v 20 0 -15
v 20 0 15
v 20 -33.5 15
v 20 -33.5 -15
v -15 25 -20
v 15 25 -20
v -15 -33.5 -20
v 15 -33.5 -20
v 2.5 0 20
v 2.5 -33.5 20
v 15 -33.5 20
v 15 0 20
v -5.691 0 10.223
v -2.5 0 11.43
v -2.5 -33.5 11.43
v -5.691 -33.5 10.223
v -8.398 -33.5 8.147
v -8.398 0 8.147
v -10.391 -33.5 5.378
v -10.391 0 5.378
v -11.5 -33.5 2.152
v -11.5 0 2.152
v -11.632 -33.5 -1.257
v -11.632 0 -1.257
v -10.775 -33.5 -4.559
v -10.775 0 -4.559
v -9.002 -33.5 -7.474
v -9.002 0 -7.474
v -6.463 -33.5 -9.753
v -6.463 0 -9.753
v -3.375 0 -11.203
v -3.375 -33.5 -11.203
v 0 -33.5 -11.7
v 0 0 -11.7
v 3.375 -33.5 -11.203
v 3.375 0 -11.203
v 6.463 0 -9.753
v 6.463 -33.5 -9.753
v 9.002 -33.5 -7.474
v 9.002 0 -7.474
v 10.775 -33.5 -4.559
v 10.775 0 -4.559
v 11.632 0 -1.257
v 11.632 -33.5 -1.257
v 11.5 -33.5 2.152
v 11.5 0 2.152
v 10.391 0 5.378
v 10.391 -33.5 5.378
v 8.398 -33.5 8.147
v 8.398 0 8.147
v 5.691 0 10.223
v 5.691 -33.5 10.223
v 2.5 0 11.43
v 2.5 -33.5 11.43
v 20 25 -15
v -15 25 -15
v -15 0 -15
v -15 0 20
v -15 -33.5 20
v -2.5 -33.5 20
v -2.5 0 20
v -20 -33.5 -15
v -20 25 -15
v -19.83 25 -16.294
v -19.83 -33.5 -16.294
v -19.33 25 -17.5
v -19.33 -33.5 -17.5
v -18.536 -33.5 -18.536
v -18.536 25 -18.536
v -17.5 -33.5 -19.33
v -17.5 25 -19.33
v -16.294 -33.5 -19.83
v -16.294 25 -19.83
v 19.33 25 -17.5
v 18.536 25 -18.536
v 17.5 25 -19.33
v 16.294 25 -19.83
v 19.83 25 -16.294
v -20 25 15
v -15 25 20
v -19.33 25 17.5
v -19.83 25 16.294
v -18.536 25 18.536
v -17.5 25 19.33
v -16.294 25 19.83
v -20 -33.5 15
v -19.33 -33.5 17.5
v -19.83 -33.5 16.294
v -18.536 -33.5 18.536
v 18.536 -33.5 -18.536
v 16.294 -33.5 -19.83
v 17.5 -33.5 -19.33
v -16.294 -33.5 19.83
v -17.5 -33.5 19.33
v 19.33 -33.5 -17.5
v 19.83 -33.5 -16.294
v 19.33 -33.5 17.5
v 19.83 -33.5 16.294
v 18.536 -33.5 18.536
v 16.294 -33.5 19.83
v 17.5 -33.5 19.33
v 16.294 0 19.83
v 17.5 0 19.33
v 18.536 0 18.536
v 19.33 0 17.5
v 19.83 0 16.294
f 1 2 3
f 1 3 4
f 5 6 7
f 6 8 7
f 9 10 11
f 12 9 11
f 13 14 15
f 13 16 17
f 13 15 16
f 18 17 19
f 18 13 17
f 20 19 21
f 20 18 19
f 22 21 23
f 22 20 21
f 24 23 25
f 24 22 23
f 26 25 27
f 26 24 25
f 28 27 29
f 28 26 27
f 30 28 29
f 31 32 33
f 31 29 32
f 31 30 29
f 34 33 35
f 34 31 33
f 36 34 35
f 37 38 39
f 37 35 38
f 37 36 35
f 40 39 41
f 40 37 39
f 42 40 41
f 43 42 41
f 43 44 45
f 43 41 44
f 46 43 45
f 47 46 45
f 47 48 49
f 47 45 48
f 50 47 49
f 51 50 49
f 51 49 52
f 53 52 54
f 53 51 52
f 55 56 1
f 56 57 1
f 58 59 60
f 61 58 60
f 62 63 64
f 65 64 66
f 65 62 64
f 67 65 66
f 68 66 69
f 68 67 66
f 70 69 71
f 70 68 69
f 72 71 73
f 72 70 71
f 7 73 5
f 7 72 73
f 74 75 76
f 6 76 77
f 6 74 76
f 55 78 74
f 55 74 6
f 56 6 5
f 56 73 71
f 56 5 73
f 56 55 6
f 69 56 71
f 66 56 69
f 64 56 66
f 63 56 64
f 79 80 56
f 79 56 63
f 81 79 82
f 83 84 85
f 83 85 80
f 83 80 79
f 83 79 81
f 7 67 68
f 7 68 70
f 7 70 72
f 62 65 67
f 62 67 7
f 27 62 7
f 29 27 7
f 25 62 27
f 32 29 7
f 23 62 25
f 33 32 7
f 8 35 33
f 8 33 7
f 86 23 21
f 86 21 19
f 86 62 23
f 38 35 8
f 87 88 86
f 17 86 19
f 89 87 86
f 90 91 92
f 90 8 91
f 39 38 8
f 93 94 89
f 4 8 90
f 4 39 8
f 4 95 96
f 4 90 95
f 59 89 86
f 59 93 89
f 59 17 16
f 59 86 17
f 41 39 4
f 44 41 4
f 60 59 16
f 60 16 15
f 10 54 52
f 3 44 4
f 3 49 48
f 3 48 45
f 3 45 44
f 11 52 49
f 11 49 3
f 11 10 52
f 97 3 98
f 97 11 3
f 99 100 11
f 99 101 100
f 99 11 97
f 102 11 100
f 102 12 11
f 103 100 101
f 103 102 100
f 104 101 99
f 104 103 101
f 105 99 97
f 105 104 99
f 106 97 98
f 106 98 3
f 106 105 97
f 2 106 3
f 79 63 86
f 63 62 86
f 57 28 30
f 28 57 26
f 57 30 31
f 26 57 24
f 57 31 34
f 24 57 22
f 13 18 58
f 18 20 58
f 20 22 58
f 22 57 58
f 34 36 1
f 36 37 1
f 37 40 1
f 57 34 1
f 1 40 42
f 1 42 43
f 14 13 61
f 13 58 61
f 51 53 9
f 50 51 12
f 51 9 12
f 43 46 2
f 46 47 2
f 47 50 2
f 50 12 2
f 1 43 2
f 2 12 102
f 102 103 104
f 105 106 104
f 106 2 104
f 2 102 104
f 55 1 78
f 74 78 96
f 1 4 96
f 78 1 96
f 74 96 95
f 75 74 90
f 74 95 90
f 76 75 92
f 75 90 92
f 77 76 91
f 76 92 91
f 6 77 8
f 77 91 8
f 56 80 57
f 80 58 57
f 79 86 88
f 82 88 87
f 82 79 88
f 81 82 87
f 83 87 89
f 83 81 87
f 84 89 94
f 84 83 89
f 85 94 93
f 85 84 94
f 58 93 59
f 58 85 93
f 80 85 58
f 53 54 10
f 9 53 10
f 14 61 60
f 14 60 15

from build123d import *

# Parameters (mm, degrees)
F0_W      = 40
F0_H      = 40
F0_R      = 11.7
F1_DEPTH  = 3.5
F2_R      = 16.7
F2_R_2    = 11.7
F3_DEPTH  = 30
F4_W      = 5
F4_H      = 29.243415
F5_DEPTH  = 33.5
F6_W      = 40
F6_H      = 40
F6_R      = 16.7
F7_DEPTH  = 30.5
F9_DEPTH  = 37.3
F11_DEPTH = 25
F12_R     = 5


with BuildPart() as f1:
    # F0 (on Front) → F1 (new body)
    with BuildSketch(Plane.XZ):
        Rectangle(F0_W, F0_H)
        Circle(F0_R, mode=Mode.SUBTRACT)
    extrude(amount=F1_DEPTH)

    # F2 (on face) → F3 (join)
    with BuildSketch(Plane.XZ.offset(3.5)):
        Circle(F2_R)
        Circle(F2_R_2, mode=Mode.SUBTRACT)
    extrude(amount=F3_DEPTH)

    # F4 (on face) → F5 (cut, through all)
    with BuildSketch(Plane.XZ.offset(33.5)):
        with Locations((0, 14.621707)):
            Rectangle(F4_W, F4_H)
    extrude(amount=-F5_DEPTH, mode=Mode.SUBTRACT)

    # F6 (on face) → F7 (join)
    with BuildSketch(Plane.XZ.offset(33.5)):
        Rectangle(F6_W, F6_H)
        Circle(F6_R, mode=Mode.SUBTRACT)
    extrude(amount=-F7_DEPTH)

    # F8 (on face) → F9 (cut)
    with BuildSketch(Plane.XZ.offset(33.5)):
        Polygon((2.5, 7.926429), (2.5, 11.429786), (2.5, 21.552972), (-2.5, 21.552972), (-2.5, 7.926429), align=None)
    extrude(amount=-F9_DEPTH, mode=Mode.SUBTRACT)

    # F10 (on face) → F11 (join)
    with BuildSketch(Plane(origin=(0, 0, 0), x_dir=(-1, 0, 0), z_dir=(0, 1, 0))):
        Polygon((20, -20), (20, 20), (15, 20), (15, -15), (-20, -15), (-20, -20), align=None)
    extrude(amount=F11_DEPTH)

    # F12
    f12_edges = [f1.edges().sort_by_distance(p)[0] for p in [
        (-20, -4.25, -20),
        (-20, -4.25, 20),
        (20, -4.25, -20),
        (20, -16.75, 20),
    ]]
    fillet(f12_edges, radius=F12_R)


solid = f1.part
